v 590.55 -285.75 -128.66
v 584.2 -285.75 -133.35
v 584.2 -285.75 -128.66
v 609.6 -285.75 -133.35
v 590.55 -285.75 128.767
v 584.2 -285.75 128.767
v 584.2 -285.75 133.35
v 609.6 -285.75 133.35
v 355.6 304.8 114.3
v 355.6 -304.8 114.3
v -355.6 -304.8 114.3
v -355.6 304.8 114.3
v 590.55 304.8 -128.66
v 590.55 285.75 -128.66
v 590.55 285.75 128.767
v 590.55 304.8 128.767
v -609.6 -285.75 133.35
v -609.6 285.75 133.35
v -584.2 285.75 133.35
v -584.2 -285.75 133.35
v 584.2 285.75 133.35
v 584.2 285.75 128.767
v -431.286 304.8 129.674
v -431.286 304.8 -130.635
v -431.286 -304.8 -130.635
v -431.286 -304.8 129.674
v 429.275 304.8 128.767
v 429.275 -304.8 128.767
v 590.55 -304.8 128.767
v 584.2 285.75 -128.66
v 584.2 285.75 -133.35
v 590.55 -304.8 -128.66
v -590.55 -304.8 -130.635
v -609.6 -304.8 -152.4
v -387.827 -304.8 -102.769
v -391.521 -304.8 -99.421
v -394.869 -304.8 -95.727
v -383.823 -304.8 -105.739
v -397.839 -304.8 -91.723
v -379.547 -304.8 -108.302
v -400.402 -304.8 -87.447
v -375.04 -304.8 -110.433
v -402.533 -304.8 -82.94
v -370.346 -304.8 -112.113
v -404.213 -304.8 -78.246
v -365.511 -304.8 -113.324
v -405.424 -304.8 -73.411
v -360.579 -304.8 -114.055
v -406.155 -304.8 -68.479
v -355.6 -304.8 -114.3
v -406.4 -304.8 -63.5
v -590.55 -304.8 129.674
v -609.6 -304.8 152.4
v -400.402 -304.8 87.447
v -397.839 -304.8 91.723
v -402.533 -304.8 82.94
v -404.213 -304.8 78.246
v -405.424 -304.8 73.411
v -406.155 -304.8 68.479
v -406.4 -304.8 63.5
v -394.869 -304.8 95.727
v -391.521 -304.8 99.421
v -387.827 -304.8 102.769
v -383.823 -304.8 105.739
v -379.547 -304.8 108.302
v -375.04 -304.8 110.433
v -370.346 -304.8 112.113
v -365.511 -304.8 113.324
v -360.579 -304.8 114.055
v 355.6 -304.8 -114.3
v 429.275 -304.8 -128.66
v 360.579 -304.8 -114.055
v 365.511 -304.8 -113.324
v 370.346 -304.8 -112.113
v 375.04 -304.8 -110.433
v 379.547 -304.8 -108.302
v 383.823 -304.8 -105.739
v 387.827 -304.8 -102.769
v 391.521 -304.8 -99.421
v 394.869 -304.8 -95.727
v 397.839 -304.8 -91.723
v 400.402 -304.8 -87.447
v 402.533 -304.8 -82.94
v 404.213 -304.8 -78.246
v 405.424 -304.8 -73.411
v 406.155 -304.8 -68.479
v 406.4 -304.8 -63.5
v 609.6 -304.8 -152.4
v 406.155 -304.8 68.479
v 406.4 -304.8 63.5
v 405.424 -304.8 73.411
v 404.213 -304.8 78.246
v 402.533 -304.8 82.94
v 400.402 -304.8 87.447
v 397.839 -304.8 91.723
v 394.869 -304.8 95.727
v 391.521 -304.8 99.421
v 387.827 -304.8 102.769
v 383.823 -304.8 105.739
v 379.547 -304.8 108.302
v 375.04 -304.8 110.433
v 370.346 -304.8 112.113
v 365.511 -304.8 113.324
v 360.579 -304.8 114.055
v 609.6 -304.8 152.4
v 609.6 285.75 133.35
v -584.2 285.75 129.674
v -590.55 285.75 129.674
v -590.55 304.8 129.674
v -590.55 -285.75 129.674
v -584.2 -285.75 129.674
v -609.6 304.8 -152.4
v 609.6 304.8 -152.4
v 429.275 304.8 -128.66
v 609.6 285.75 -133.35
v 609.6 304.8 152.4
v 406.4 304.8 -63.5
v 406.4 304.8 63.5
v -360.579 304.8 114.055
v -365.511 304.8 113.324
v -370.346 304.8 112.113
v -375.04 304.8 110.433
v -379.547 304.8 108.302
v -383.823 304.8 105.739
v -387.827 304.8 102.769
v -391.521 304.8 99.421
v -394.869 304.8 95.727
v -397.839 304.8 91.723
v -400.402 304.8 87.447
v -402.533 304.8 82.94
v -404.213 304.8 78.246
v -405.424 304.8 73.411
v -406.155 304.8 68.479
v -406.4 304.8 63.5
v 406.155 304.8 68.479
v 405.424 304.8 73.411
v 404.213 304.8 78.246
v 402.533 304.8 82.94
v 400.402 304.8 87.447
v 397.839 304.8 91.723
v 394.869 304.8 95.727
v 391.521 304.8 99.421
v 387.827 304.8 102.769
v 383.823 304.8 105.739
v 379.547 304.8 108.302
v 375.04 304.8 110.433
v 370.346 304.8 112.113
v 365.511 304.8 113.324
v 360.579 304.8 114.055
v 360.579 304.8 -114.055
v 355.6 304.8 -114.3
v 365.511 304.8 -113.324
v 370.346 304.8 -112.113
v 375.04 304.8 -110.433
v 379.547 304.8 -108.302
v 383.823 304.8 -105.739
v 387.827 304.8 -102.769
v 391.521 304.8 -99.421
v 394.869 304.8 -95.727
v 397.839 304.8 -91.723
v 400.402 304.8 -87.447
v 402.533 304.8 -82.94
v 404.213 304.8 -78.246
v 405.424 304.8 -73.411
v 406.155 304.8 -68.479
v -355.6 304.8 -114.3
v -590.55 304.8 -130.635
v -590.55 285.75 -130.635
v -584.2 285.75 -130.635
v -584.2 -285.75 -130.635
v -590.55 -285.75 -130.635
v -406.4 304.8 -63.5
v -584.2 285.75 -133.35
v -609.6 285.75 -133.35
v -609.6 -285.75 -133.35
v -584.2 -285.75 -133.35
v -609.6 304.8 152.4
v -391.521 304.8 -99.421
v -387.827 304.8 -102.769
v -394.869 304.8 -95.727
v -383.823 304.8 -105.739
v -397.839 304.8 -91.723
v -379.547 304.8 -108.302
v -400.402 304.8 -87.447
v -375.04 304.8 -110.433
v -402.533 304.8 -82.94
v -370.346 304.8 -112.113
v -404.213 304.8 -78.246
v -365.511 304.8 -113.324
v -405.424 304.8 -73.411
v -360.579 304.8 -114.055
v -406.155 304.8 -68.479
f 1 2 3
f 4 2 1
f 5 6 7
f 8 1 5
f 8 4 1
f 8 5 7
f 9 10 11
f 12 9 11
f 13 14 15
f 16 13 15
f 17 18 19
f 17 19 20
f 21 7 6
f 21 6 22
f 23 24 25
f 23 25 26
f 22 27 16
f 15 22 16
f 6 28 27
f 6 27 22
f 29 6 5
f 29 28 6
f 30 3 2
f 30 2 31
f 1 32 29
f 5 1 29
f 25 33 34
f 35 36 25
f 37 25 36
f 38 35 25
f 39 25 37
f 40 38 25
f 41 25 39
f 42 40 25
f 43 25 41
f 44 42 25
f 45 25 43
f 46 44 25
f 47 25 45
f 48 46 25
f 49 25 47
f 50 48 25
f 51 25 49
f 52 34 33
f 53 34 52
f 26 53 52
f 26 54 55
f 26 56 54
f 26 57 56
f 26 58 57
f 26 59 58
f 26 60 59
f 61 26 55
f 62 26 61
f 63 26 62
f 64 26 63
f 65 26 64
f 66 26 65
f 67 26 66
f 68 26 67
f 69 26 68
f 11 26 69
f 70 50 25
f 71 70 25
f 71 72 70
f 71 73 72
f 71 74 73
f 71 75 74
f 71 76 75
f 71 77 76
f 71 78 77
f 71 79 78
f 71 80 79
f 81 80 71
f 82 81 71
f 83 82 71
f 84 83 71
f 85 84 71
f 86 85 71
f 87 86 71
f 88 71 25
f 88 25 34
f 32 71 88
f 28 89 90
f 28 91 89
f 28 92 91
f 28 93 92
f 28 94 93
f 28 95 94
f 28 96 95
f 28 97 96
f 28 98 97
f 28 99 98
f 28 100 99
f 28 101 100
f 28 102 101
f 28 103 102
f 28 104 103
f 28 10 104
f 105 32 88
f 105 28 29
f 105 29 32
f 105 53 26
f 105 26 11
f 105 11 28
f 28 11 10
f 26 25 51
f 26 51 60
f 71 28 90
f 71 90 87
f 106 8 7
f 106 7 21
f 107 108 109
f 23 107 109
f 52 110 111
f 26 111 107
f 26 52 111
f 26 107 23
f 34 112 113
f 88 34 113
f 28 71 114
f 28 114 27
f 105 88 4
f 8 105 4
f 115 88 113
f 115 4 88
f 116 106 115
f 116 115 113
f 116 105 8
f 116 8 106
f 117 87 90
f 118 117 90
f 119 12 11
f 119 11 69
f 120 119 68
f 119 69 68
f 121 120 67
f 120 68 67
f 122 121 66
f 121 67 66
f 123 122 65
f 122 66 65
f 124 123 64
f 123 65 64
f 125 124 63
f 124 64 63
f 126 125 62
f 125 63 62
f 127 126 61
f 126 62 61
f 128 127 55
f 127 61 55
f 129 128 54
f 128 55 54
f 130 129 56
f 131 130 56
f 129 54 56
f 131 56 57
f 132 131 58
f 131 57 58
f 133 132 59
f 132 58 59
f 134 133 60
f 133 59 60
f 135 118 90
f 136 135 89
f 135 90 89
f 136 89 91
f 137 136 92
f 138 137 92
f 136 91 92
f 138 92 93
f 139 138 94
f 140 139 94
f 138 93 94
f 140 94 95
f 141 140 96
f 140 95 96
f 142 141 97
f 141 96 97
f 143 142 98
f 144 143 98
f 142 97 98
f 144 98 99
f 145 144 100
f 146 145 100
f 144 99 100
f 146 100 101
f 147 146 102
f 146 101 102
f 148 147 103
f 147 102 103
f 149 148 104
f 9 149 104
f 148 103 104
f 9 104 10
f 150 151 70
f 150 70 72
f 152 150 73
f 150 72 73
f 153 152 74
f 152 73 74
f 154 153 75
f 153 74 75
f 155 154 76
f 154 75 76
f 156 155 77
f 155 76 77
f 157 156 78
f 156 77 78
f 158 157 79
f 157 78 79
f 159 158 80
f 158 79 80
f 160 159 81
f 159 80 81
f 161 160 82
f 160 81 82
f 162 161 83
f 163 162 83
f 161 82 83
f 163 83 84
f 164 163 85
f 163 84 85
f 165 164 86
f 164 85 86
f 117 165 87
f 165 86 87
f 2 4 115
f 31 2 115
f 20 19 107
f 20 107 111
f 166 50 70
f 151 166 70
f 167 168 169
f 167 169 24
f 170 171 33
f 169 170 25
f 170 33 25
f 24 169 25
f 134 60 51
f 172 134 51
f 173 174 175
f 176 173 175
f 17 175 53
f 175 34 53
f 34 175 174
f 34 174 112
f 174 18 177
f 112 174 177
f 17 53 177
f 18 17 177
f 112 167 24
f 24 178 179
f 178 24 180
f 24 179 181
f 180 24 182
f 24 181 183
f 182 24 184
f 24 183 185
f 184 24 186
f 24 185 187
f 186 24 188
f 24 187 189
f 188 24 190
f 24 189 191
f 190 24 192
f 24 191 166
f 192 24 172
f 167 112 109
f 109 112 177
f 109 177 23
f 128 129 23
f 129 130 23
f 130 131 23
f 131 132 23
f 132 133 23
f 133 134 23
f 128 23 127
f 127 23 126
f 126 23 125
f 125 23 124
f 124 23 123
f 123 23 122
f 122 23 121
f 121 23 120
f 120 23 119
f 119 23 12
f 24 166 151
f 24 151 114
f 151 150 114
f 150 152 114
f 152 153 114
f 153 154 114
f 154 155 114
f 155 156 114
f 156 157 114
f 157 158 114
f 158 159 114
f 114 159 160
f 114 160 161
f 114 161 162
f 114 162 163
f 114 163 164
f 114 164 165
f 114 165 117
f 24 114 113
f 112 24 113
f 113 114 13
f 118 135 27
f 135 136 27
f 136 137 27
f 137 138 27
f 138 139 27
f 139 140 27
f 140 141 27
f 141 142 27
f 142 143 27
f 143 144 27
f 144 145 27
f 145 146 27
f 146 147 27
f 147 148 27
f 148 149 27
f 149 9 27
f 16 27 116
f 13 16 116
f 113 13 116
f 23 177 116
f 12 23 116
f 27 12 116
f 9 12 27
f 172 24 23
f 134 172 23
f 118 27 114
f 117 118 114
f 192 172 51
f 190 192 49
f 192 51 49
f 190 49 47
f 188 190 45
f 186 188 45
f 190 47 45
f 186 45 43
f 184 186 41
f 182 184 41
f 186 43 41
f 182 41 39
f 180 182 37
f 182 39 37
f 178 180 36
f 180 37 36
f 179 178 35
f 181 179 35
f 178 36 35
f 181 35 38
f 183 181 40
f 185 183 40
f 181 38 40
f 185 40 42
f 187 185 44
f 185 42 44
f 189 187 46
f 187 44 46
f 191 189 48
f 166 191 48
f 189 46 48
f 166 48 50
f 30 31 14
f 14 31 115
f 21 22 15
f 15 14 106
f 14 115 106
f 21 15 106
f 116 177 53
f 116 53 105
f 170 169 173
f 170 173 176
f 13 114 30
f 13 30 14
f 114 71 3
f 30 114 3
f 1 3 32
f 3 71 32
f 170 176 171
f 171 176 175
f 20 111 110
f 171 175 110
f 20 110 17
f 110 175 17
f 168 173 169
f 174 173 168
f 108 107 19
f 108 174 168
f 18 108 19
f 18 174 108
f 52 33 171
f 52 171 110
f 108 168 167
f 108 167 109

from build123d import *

# Parameters (mm, degrees)
F0_W     = 1219.2
F0_H     = 609.6
F1_DEPTH = 152.4
F3_DEPTH = 1219.2
F4_W     = 161.274815
F4_H     = 257.426903
F4_W_2   = 159.263874
F4_H_2   = 260.308549
F5_DEPTH = 1219.2
F6_W     = 571.5
F6_H     = 266.7
F7_DEPTH = 25.4
F8_W     = 571.5
F8_H     = 266.7
F9_DEPTH = 25.4


with BuildPart() as f1:
    # F0 (on Top) → F1 (new body, symmetric)
    with BuildSketch(Plane.XY):
        Rectangle(F0_W, F0_H)
    extrude(amount=F1_DEPTH, both=True)

    # F2 (on face) → F3 (cut)
    with BuildSketch(Plane.XZ.offset(304.8)):
        with BuildLine():
            Line((-355.6, -114.3), (355.6, -114.3))
            ThreePointArc((355.6, -114.3), (391.521024, -99.421024), (406.4, -63.5))
            Line((406.4, -63.5), (406.4, 63.5))
            ThreePointArc((406.4, 63.5), (391.521024, 99.421024), (355.6, 114.3))
            Line((355.6, 114.3), (-355.6, 114.3))
            ThreePointArc((-355.6, 114.3), (-391.521024, 99.421024), (-406.4, 63.5))
            Line((-406.4, 63.5), (-406.4, -63.5))
            ThreePointArc((-406.4, -63.5), (-391.521024, -99.421024), (-355.6, -114.3))
        make_face()
    extrude(amount=-F3_DEPTH, mode=Mode.SUBTRACT)

    # F4 (on face) → F5 (cut)
    with BuildSketch(Plane.XZ.offset(304.8)):
        with Locations((509.912592, 0.053682)):
            Rectangle(F4_W, F4_H)
        with Locations((-510.918063, -0.480272)):
            Rectangle(F4_W_2, F4_H_2)
    extrude(amount=-F5_DEPTH, mode=Mode.SUBTRACT)

    # F6 (on face) → F7 (cut)
    with BuildSketch(Plane.YZ.offset(609.6)):
        Rectangle(F6_W, F6_H)
    extrude(amount=-F7_DEPTH, mode=Mode.SUBTRACT)

    # F8 (on face) → F9 (cut)
    with BuildSketch(Plane(origin=(-609.6, 0, 0), x_dir=(0, -1, 0), z_dir=(-1, 0, 0))):
        Rectangle(F8_W, F8_H)
    extrude(amount=-F9_DEPTH, mode=Mode.SUBTRACT)


solid = f1.part
